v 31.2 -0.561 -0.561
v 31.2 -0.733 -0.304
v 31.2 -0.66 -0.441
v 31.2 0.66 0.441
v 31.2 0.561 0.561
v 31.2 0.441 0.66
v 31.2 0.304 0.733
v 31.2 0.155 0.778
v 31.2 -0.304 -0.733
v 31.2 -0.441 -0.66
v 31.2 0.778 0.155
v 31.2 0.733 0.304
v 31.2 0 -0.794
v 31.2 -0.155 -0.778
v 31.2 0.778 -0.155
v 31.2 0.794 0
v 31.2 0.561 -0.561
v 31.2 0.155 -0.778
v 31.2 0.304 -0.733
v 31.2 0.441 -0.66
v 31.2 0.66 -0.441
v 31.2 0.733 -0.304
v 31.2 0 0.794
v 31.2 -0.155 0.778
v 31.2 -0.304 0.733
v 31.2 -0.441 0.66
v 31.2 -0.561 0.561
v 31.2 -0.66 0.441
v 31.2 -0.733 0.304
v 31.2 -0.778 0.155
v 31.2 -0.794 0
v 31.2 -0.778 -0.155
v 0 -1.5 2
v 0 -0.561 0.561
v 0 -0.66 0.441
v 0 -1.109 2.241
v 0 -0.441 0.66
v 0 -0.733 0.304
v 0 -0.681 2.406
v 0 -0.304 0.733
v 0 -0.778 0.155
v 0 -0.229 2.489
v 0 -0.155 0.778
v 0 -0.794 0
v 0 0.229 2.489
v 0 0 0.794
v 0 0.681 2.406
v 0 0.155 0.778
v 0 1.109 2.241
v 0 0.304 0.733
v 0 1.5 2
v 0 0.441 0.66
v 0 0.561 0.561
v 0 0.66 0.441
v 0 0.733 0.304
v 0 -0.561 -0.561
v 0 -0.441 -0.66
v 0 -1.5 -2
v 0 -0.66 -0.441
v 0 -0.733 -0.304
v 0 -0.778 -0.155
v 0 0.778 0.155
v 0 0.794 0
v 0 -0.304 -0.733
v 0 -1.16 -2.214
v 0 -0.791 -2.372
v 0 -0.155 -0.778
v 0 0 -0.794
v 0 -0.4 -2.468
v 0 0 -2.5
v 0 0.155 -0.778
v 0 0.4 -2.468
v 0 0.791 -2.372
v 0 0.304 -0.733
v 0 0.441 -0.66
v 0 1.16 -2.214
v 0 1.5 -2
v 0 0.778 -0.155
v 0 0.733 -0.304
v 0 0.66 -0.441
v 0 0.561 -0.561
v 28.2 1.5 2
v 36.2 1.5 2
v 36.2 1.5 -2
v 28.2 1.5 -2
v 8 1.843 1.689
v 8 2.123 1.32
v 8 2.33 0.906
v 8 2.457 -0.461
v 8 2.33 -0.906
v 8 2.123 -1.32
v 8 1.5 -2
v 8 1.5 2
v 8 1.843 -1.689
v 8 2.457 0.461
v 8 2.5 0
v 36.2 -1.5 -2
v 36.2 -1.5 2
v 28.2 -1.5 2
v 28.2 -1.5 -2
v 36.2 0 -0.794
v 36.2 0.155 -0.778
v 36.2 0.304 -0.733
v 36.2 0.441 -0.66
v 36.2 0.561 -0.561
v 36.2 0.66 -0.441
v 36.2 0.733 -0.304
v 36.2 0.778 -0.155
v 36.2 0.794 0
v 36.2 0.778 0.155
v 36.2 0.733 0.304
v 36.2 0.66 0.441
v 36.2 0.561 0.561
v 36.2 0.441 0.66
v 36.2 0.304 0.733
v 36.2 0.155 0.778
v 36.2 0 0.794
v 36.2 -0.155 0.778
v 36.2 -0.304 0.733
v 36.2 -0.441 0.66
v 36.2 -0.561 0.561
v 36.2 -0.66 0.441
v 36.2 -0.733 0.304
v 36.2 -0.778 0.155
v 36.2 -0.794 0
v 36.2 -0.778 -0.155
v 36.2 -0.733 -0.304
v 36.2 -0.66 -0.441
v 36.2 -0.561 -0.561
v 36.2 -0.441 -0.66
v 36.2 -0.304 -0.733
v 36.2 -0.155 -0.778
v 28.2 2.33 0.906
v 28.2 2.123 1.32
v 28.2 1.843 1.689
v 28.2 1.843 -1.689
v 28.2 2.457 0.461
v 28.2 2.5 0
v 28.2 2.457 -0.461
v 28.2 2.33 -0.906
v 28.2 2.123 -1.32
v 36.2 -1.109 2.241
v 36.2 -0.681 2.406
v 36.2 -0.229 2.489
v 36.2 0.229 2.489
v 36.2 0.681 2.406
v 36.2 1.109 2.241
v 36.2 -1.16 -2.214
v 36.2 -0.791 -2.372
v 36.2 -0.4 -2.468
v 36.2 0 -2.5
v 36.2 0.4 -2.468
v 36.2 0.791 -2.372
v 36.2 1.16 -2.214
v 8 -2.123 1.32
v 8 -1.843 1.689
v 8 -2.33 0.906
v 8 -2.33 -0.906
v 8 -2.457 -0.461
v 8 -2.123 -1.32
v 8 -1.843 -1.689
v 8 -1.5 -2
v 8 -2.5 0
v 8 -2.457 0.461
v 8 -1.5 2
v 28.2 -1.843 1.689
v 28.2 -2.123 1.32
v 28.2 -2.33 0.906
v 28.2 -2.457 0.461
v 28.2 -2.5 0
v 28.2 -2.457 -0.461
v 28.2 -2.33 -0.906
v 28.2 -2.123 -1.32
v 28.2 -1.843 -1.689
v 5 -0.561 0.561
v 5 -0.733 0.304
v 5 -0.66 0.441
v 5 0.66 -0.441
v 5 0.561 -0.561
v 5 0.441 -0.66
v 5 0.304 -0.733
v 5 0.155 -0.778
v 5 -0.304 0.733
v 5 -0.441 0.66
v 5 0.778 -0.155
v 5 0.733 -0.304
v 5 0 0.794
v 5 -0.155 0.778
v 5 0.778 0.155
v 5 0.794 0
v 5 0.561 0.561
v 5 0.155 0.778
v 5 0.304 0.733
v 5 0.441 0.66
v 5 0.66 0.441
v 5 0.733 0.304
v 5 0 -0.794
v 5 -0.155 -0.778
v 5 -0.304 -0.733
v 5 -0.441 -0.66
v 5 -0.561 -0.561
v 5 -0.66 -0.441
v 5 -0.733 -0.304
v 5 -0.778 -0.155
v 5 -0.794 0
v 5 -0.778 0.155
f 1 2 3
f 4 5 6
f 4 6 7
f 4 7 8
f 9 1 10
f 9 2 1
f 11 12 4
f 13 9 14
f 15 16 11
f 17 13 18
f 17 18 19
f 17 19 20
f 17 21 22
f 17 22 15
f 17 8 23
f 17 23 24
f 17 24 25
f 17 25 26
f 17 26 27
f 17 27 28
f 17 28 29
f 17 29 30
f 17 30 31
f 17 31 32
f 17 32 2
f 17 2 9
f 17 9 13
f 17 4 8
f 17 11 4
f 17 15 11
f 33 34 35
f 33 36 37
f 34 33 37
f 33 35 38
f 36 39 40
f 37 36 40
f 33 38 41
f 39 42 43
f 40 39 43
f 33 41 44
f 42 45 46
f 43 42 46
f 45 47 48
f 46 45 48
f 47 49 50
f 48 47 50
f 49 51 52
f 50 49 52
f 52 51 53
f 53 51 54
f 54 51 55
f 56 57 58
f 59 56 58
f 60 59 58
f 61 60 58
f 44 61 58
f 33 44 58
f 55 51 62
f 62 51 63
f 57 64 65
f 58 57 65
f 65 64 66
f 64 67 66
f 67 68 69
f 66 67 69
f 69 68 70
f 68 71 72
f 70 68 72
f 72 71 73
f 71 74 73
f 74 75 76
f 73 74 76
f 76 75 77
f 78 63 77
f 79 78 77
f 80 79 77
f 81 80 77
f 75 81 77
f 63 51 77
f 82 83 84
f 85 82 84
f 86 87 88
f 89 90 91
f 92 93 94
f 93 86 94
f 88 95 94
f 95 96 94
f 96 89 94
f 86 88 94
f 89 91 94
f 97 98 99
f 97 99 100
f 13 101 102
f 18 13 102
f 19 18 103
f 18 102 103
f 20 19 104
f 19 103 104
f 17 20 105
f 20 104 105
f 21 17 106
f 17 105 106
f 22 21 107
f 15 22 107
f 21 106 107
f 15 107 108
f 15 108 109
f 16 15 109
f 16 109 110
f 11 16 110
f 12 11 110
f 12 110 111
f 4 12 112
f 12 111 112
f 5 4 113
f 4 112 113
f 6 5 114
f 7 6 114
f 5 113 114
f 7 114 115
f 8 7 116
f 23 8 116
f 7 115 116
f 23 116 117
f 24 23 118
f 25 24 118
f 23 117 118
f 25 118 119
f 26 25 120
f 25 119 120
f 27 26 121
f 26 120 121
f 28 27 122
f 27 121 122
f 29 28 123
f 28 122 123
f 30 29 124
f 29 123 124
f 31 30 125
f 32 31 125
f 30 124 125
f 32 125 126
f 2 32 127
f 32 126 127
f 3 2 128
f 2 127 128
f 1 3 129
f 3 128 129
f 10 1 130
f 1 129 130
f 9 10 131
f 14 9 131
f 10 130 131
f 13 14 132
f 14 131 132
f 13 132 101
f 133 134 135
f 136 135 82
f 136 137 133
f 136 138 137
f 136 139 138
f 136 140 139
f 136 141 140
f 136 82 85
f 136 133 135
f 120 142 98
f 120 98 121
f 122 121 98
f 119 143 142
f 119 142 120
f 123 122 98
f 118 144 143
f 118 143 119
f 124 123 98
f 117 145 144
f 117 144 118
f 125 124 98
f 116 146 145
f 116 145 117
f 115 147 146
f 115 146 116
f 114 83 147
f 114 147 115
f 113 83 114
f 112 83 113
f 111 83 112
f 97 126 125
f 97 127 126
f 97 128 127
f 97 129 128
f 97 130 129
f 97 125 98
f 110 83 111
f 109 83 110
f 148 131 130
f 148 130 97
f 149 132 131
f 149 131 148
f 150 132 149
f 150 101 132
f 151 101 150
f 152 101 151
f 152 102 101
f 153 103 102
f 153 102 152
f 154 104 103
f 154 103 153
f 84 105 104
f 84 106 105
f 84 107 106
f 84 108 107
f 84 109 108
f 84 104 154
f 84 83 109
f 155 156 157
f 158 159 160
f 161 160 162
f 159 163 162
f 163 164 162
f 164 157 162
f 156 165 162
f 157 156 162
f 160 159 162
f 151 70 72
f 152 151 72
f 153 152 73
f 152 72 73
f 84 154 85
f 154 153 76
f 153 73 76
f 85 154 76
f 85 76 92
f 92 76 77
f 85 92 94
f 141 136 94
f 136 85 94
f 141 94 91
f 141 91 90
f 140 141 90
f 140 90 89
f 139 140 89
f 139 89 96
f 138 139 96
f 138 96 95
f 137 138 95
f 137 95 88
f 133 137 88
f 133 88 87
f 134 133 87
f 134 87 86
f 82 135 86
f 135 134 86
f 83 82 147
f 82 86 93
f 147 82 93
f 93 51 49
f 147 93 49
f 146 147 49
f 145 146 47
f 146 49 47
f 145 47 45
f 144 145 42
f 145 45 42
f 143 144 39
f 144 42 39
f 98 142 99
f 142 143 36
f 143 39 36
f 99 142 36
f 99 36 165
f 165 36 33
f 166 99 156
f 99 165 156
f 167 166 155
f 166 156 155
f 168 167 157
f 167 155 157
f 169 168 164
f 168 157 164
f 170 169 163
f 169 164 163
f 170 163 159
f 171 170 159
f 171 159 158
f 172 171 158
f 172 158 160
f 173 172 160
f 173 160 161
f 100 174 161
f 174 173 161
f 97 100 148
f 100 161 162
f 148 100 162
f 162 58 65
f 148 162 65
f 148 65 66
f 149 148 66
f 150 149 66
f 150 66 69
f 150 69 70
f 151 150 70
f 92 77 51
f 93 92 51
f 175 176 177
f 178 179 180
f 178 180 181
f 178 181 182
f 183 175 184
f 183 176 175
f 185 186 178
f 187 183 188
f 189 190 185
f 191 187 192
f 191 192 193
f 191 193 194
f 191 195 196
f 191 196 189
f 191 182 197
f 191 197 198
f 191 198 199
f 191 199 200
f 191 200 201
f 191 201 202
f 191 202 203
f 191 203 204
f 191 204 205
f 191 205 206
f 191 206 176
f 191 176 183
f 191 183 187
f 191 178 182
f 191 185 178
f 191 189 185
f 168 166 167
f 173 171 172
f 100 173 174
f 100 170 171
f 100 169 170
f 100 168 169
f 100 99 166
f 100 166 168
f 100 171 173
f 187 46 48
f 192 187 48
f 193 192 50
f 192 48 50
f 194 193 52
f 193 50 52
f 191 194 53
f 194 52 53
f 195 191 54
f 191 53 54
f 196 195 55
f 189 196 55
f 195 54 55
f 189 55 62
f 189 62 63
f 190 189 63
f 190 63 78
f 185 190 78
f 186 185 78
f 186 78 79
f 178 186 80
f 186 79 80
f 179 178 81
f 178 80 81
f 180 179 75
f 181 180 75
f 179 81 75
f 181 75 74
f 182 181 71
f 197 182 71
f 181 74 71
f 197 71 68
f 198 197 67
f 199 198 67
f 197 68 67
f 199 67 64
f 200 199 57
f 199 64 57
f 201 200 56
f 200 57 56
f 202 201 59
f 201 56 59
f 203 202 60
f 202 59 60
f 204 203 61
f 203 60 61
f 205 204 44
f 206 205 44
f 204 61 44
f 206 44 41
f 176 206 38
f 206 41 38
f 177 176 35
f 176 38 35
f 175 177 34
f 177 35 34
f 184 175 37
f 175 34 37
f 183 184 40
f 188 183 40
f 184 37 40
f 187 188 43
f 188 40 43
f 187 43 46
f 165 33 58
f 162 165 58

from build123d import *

# Parameters (mm, degrees)
CROQUIS1_R              = 2.5
SALIENTE_EXTRUIR1_DEPTH = 36.2
CROQUIS2_OUTSIDE_W      = 14.376
CROQUIS2_OUTSIDE_H      = 14.376
CROQUIS2_OUTSIDE_W_2    = 5.186631864
CROQUIS2_OUTSIDE_H_2    = 3
CORTAR_EXTRUIR1_DEPTH   = 8
CROQUIS2_3_R            = 0.79375
CORTAR_EXTRUIR2_DEPTH   = 5
CROQUIS3_OUTSIDE_W      = 14.376
CROQUIS3_OUTSIDE_H      = 14.376
CORTAR_EXTRUIR3_DEPTH   = 8
CORTAR_EXTRUIR4_START   = -5
CROQUIS4_R              = 0.79375
CORTAR_EXTRUIR4_DEPTH   = 5


with BuildPart() as part:
    # Croquis1 → Saliente-Extruir1 (new body)
    with BuildSketch(Plane(origin=(0, 0, 0), x_dir=(0, 0, -1), z_dir=(1, 0, 0))):
        Circle(CROQUIS1_R)
    extrude(amount=SALIENTE_EXTRUIR1_DEPTH)

    # Croquis2 outside → Cortar-Extruir1 (cut)
    with BuildSketch(Plane(origin=(36.2, 0, 0), x_dir=(0, 0, -1), z_dir=(1, 0, 0))):
        Rectangle(CROQUIS2_OUTSIDE_W, CROQUIS2_OUTSIDE_H)
        Rectangle(CROQUIS2_OUTSIDE_W_2, CROQUIS2_OUTSIDE_H_2, mode=Mode.SUBTRACT)
    extrude(amount=-CORTAR_EXTRUIR1_DEPTH, mode=Mode.SUBTRACT)

    # Croquis2<3> → Cortar-Extruir2 (cut)
    with BuildSketch(Plane(origin=(36.2, 0, 0), x_dir=(0, 0, -1), z_dir=(1, 0, 0))):
        Circle(CROQUIS2_3_R)
    extrude(amount=-CORTAR_EXTRUIR2_DEPTH, mode=Mode.SUBTRACT)

    # Croquis3 outside → Cortar-Extruir3 (cut)
    with BuildSketch(Plane(origin=(0, 0, 0), x_dir=(0, 0, -1), z_dir=(1, 0, 0))):
        Rectangle(CROQUIS3_OUTSIDE_W, CROQUIS3_OUTSIDE_H)
        with BuildLine():
            Line((2, 1.5), (-2, 1.5))
            ThreePointArc((-2, 1.5), (-2.5, 0), (-2, -1.5))
            Line((-2, -1.5), (2, -1.5))
            ThreePointArc((2, -1.5), (2.5, 0), (2, 1.5))
        make_face(mode=Mode.SUBTRACT)
    extrude(amount=CORTAR_EXTRUIR3_DEPTH, mode=Mode.SUBTRACT)

    # Croquis4 → Cortar-Extruir4 (cut)
    with BuildSketch(Plane.ZY.offset(CORTAR_EXTRUIR4_START)):
        Circle(CROQUIS4_R)
    extrude(amount=CORTAR_EXTRUIR4_DEPTH, mode=Mode.SUBTRACT)


solid = part.part
